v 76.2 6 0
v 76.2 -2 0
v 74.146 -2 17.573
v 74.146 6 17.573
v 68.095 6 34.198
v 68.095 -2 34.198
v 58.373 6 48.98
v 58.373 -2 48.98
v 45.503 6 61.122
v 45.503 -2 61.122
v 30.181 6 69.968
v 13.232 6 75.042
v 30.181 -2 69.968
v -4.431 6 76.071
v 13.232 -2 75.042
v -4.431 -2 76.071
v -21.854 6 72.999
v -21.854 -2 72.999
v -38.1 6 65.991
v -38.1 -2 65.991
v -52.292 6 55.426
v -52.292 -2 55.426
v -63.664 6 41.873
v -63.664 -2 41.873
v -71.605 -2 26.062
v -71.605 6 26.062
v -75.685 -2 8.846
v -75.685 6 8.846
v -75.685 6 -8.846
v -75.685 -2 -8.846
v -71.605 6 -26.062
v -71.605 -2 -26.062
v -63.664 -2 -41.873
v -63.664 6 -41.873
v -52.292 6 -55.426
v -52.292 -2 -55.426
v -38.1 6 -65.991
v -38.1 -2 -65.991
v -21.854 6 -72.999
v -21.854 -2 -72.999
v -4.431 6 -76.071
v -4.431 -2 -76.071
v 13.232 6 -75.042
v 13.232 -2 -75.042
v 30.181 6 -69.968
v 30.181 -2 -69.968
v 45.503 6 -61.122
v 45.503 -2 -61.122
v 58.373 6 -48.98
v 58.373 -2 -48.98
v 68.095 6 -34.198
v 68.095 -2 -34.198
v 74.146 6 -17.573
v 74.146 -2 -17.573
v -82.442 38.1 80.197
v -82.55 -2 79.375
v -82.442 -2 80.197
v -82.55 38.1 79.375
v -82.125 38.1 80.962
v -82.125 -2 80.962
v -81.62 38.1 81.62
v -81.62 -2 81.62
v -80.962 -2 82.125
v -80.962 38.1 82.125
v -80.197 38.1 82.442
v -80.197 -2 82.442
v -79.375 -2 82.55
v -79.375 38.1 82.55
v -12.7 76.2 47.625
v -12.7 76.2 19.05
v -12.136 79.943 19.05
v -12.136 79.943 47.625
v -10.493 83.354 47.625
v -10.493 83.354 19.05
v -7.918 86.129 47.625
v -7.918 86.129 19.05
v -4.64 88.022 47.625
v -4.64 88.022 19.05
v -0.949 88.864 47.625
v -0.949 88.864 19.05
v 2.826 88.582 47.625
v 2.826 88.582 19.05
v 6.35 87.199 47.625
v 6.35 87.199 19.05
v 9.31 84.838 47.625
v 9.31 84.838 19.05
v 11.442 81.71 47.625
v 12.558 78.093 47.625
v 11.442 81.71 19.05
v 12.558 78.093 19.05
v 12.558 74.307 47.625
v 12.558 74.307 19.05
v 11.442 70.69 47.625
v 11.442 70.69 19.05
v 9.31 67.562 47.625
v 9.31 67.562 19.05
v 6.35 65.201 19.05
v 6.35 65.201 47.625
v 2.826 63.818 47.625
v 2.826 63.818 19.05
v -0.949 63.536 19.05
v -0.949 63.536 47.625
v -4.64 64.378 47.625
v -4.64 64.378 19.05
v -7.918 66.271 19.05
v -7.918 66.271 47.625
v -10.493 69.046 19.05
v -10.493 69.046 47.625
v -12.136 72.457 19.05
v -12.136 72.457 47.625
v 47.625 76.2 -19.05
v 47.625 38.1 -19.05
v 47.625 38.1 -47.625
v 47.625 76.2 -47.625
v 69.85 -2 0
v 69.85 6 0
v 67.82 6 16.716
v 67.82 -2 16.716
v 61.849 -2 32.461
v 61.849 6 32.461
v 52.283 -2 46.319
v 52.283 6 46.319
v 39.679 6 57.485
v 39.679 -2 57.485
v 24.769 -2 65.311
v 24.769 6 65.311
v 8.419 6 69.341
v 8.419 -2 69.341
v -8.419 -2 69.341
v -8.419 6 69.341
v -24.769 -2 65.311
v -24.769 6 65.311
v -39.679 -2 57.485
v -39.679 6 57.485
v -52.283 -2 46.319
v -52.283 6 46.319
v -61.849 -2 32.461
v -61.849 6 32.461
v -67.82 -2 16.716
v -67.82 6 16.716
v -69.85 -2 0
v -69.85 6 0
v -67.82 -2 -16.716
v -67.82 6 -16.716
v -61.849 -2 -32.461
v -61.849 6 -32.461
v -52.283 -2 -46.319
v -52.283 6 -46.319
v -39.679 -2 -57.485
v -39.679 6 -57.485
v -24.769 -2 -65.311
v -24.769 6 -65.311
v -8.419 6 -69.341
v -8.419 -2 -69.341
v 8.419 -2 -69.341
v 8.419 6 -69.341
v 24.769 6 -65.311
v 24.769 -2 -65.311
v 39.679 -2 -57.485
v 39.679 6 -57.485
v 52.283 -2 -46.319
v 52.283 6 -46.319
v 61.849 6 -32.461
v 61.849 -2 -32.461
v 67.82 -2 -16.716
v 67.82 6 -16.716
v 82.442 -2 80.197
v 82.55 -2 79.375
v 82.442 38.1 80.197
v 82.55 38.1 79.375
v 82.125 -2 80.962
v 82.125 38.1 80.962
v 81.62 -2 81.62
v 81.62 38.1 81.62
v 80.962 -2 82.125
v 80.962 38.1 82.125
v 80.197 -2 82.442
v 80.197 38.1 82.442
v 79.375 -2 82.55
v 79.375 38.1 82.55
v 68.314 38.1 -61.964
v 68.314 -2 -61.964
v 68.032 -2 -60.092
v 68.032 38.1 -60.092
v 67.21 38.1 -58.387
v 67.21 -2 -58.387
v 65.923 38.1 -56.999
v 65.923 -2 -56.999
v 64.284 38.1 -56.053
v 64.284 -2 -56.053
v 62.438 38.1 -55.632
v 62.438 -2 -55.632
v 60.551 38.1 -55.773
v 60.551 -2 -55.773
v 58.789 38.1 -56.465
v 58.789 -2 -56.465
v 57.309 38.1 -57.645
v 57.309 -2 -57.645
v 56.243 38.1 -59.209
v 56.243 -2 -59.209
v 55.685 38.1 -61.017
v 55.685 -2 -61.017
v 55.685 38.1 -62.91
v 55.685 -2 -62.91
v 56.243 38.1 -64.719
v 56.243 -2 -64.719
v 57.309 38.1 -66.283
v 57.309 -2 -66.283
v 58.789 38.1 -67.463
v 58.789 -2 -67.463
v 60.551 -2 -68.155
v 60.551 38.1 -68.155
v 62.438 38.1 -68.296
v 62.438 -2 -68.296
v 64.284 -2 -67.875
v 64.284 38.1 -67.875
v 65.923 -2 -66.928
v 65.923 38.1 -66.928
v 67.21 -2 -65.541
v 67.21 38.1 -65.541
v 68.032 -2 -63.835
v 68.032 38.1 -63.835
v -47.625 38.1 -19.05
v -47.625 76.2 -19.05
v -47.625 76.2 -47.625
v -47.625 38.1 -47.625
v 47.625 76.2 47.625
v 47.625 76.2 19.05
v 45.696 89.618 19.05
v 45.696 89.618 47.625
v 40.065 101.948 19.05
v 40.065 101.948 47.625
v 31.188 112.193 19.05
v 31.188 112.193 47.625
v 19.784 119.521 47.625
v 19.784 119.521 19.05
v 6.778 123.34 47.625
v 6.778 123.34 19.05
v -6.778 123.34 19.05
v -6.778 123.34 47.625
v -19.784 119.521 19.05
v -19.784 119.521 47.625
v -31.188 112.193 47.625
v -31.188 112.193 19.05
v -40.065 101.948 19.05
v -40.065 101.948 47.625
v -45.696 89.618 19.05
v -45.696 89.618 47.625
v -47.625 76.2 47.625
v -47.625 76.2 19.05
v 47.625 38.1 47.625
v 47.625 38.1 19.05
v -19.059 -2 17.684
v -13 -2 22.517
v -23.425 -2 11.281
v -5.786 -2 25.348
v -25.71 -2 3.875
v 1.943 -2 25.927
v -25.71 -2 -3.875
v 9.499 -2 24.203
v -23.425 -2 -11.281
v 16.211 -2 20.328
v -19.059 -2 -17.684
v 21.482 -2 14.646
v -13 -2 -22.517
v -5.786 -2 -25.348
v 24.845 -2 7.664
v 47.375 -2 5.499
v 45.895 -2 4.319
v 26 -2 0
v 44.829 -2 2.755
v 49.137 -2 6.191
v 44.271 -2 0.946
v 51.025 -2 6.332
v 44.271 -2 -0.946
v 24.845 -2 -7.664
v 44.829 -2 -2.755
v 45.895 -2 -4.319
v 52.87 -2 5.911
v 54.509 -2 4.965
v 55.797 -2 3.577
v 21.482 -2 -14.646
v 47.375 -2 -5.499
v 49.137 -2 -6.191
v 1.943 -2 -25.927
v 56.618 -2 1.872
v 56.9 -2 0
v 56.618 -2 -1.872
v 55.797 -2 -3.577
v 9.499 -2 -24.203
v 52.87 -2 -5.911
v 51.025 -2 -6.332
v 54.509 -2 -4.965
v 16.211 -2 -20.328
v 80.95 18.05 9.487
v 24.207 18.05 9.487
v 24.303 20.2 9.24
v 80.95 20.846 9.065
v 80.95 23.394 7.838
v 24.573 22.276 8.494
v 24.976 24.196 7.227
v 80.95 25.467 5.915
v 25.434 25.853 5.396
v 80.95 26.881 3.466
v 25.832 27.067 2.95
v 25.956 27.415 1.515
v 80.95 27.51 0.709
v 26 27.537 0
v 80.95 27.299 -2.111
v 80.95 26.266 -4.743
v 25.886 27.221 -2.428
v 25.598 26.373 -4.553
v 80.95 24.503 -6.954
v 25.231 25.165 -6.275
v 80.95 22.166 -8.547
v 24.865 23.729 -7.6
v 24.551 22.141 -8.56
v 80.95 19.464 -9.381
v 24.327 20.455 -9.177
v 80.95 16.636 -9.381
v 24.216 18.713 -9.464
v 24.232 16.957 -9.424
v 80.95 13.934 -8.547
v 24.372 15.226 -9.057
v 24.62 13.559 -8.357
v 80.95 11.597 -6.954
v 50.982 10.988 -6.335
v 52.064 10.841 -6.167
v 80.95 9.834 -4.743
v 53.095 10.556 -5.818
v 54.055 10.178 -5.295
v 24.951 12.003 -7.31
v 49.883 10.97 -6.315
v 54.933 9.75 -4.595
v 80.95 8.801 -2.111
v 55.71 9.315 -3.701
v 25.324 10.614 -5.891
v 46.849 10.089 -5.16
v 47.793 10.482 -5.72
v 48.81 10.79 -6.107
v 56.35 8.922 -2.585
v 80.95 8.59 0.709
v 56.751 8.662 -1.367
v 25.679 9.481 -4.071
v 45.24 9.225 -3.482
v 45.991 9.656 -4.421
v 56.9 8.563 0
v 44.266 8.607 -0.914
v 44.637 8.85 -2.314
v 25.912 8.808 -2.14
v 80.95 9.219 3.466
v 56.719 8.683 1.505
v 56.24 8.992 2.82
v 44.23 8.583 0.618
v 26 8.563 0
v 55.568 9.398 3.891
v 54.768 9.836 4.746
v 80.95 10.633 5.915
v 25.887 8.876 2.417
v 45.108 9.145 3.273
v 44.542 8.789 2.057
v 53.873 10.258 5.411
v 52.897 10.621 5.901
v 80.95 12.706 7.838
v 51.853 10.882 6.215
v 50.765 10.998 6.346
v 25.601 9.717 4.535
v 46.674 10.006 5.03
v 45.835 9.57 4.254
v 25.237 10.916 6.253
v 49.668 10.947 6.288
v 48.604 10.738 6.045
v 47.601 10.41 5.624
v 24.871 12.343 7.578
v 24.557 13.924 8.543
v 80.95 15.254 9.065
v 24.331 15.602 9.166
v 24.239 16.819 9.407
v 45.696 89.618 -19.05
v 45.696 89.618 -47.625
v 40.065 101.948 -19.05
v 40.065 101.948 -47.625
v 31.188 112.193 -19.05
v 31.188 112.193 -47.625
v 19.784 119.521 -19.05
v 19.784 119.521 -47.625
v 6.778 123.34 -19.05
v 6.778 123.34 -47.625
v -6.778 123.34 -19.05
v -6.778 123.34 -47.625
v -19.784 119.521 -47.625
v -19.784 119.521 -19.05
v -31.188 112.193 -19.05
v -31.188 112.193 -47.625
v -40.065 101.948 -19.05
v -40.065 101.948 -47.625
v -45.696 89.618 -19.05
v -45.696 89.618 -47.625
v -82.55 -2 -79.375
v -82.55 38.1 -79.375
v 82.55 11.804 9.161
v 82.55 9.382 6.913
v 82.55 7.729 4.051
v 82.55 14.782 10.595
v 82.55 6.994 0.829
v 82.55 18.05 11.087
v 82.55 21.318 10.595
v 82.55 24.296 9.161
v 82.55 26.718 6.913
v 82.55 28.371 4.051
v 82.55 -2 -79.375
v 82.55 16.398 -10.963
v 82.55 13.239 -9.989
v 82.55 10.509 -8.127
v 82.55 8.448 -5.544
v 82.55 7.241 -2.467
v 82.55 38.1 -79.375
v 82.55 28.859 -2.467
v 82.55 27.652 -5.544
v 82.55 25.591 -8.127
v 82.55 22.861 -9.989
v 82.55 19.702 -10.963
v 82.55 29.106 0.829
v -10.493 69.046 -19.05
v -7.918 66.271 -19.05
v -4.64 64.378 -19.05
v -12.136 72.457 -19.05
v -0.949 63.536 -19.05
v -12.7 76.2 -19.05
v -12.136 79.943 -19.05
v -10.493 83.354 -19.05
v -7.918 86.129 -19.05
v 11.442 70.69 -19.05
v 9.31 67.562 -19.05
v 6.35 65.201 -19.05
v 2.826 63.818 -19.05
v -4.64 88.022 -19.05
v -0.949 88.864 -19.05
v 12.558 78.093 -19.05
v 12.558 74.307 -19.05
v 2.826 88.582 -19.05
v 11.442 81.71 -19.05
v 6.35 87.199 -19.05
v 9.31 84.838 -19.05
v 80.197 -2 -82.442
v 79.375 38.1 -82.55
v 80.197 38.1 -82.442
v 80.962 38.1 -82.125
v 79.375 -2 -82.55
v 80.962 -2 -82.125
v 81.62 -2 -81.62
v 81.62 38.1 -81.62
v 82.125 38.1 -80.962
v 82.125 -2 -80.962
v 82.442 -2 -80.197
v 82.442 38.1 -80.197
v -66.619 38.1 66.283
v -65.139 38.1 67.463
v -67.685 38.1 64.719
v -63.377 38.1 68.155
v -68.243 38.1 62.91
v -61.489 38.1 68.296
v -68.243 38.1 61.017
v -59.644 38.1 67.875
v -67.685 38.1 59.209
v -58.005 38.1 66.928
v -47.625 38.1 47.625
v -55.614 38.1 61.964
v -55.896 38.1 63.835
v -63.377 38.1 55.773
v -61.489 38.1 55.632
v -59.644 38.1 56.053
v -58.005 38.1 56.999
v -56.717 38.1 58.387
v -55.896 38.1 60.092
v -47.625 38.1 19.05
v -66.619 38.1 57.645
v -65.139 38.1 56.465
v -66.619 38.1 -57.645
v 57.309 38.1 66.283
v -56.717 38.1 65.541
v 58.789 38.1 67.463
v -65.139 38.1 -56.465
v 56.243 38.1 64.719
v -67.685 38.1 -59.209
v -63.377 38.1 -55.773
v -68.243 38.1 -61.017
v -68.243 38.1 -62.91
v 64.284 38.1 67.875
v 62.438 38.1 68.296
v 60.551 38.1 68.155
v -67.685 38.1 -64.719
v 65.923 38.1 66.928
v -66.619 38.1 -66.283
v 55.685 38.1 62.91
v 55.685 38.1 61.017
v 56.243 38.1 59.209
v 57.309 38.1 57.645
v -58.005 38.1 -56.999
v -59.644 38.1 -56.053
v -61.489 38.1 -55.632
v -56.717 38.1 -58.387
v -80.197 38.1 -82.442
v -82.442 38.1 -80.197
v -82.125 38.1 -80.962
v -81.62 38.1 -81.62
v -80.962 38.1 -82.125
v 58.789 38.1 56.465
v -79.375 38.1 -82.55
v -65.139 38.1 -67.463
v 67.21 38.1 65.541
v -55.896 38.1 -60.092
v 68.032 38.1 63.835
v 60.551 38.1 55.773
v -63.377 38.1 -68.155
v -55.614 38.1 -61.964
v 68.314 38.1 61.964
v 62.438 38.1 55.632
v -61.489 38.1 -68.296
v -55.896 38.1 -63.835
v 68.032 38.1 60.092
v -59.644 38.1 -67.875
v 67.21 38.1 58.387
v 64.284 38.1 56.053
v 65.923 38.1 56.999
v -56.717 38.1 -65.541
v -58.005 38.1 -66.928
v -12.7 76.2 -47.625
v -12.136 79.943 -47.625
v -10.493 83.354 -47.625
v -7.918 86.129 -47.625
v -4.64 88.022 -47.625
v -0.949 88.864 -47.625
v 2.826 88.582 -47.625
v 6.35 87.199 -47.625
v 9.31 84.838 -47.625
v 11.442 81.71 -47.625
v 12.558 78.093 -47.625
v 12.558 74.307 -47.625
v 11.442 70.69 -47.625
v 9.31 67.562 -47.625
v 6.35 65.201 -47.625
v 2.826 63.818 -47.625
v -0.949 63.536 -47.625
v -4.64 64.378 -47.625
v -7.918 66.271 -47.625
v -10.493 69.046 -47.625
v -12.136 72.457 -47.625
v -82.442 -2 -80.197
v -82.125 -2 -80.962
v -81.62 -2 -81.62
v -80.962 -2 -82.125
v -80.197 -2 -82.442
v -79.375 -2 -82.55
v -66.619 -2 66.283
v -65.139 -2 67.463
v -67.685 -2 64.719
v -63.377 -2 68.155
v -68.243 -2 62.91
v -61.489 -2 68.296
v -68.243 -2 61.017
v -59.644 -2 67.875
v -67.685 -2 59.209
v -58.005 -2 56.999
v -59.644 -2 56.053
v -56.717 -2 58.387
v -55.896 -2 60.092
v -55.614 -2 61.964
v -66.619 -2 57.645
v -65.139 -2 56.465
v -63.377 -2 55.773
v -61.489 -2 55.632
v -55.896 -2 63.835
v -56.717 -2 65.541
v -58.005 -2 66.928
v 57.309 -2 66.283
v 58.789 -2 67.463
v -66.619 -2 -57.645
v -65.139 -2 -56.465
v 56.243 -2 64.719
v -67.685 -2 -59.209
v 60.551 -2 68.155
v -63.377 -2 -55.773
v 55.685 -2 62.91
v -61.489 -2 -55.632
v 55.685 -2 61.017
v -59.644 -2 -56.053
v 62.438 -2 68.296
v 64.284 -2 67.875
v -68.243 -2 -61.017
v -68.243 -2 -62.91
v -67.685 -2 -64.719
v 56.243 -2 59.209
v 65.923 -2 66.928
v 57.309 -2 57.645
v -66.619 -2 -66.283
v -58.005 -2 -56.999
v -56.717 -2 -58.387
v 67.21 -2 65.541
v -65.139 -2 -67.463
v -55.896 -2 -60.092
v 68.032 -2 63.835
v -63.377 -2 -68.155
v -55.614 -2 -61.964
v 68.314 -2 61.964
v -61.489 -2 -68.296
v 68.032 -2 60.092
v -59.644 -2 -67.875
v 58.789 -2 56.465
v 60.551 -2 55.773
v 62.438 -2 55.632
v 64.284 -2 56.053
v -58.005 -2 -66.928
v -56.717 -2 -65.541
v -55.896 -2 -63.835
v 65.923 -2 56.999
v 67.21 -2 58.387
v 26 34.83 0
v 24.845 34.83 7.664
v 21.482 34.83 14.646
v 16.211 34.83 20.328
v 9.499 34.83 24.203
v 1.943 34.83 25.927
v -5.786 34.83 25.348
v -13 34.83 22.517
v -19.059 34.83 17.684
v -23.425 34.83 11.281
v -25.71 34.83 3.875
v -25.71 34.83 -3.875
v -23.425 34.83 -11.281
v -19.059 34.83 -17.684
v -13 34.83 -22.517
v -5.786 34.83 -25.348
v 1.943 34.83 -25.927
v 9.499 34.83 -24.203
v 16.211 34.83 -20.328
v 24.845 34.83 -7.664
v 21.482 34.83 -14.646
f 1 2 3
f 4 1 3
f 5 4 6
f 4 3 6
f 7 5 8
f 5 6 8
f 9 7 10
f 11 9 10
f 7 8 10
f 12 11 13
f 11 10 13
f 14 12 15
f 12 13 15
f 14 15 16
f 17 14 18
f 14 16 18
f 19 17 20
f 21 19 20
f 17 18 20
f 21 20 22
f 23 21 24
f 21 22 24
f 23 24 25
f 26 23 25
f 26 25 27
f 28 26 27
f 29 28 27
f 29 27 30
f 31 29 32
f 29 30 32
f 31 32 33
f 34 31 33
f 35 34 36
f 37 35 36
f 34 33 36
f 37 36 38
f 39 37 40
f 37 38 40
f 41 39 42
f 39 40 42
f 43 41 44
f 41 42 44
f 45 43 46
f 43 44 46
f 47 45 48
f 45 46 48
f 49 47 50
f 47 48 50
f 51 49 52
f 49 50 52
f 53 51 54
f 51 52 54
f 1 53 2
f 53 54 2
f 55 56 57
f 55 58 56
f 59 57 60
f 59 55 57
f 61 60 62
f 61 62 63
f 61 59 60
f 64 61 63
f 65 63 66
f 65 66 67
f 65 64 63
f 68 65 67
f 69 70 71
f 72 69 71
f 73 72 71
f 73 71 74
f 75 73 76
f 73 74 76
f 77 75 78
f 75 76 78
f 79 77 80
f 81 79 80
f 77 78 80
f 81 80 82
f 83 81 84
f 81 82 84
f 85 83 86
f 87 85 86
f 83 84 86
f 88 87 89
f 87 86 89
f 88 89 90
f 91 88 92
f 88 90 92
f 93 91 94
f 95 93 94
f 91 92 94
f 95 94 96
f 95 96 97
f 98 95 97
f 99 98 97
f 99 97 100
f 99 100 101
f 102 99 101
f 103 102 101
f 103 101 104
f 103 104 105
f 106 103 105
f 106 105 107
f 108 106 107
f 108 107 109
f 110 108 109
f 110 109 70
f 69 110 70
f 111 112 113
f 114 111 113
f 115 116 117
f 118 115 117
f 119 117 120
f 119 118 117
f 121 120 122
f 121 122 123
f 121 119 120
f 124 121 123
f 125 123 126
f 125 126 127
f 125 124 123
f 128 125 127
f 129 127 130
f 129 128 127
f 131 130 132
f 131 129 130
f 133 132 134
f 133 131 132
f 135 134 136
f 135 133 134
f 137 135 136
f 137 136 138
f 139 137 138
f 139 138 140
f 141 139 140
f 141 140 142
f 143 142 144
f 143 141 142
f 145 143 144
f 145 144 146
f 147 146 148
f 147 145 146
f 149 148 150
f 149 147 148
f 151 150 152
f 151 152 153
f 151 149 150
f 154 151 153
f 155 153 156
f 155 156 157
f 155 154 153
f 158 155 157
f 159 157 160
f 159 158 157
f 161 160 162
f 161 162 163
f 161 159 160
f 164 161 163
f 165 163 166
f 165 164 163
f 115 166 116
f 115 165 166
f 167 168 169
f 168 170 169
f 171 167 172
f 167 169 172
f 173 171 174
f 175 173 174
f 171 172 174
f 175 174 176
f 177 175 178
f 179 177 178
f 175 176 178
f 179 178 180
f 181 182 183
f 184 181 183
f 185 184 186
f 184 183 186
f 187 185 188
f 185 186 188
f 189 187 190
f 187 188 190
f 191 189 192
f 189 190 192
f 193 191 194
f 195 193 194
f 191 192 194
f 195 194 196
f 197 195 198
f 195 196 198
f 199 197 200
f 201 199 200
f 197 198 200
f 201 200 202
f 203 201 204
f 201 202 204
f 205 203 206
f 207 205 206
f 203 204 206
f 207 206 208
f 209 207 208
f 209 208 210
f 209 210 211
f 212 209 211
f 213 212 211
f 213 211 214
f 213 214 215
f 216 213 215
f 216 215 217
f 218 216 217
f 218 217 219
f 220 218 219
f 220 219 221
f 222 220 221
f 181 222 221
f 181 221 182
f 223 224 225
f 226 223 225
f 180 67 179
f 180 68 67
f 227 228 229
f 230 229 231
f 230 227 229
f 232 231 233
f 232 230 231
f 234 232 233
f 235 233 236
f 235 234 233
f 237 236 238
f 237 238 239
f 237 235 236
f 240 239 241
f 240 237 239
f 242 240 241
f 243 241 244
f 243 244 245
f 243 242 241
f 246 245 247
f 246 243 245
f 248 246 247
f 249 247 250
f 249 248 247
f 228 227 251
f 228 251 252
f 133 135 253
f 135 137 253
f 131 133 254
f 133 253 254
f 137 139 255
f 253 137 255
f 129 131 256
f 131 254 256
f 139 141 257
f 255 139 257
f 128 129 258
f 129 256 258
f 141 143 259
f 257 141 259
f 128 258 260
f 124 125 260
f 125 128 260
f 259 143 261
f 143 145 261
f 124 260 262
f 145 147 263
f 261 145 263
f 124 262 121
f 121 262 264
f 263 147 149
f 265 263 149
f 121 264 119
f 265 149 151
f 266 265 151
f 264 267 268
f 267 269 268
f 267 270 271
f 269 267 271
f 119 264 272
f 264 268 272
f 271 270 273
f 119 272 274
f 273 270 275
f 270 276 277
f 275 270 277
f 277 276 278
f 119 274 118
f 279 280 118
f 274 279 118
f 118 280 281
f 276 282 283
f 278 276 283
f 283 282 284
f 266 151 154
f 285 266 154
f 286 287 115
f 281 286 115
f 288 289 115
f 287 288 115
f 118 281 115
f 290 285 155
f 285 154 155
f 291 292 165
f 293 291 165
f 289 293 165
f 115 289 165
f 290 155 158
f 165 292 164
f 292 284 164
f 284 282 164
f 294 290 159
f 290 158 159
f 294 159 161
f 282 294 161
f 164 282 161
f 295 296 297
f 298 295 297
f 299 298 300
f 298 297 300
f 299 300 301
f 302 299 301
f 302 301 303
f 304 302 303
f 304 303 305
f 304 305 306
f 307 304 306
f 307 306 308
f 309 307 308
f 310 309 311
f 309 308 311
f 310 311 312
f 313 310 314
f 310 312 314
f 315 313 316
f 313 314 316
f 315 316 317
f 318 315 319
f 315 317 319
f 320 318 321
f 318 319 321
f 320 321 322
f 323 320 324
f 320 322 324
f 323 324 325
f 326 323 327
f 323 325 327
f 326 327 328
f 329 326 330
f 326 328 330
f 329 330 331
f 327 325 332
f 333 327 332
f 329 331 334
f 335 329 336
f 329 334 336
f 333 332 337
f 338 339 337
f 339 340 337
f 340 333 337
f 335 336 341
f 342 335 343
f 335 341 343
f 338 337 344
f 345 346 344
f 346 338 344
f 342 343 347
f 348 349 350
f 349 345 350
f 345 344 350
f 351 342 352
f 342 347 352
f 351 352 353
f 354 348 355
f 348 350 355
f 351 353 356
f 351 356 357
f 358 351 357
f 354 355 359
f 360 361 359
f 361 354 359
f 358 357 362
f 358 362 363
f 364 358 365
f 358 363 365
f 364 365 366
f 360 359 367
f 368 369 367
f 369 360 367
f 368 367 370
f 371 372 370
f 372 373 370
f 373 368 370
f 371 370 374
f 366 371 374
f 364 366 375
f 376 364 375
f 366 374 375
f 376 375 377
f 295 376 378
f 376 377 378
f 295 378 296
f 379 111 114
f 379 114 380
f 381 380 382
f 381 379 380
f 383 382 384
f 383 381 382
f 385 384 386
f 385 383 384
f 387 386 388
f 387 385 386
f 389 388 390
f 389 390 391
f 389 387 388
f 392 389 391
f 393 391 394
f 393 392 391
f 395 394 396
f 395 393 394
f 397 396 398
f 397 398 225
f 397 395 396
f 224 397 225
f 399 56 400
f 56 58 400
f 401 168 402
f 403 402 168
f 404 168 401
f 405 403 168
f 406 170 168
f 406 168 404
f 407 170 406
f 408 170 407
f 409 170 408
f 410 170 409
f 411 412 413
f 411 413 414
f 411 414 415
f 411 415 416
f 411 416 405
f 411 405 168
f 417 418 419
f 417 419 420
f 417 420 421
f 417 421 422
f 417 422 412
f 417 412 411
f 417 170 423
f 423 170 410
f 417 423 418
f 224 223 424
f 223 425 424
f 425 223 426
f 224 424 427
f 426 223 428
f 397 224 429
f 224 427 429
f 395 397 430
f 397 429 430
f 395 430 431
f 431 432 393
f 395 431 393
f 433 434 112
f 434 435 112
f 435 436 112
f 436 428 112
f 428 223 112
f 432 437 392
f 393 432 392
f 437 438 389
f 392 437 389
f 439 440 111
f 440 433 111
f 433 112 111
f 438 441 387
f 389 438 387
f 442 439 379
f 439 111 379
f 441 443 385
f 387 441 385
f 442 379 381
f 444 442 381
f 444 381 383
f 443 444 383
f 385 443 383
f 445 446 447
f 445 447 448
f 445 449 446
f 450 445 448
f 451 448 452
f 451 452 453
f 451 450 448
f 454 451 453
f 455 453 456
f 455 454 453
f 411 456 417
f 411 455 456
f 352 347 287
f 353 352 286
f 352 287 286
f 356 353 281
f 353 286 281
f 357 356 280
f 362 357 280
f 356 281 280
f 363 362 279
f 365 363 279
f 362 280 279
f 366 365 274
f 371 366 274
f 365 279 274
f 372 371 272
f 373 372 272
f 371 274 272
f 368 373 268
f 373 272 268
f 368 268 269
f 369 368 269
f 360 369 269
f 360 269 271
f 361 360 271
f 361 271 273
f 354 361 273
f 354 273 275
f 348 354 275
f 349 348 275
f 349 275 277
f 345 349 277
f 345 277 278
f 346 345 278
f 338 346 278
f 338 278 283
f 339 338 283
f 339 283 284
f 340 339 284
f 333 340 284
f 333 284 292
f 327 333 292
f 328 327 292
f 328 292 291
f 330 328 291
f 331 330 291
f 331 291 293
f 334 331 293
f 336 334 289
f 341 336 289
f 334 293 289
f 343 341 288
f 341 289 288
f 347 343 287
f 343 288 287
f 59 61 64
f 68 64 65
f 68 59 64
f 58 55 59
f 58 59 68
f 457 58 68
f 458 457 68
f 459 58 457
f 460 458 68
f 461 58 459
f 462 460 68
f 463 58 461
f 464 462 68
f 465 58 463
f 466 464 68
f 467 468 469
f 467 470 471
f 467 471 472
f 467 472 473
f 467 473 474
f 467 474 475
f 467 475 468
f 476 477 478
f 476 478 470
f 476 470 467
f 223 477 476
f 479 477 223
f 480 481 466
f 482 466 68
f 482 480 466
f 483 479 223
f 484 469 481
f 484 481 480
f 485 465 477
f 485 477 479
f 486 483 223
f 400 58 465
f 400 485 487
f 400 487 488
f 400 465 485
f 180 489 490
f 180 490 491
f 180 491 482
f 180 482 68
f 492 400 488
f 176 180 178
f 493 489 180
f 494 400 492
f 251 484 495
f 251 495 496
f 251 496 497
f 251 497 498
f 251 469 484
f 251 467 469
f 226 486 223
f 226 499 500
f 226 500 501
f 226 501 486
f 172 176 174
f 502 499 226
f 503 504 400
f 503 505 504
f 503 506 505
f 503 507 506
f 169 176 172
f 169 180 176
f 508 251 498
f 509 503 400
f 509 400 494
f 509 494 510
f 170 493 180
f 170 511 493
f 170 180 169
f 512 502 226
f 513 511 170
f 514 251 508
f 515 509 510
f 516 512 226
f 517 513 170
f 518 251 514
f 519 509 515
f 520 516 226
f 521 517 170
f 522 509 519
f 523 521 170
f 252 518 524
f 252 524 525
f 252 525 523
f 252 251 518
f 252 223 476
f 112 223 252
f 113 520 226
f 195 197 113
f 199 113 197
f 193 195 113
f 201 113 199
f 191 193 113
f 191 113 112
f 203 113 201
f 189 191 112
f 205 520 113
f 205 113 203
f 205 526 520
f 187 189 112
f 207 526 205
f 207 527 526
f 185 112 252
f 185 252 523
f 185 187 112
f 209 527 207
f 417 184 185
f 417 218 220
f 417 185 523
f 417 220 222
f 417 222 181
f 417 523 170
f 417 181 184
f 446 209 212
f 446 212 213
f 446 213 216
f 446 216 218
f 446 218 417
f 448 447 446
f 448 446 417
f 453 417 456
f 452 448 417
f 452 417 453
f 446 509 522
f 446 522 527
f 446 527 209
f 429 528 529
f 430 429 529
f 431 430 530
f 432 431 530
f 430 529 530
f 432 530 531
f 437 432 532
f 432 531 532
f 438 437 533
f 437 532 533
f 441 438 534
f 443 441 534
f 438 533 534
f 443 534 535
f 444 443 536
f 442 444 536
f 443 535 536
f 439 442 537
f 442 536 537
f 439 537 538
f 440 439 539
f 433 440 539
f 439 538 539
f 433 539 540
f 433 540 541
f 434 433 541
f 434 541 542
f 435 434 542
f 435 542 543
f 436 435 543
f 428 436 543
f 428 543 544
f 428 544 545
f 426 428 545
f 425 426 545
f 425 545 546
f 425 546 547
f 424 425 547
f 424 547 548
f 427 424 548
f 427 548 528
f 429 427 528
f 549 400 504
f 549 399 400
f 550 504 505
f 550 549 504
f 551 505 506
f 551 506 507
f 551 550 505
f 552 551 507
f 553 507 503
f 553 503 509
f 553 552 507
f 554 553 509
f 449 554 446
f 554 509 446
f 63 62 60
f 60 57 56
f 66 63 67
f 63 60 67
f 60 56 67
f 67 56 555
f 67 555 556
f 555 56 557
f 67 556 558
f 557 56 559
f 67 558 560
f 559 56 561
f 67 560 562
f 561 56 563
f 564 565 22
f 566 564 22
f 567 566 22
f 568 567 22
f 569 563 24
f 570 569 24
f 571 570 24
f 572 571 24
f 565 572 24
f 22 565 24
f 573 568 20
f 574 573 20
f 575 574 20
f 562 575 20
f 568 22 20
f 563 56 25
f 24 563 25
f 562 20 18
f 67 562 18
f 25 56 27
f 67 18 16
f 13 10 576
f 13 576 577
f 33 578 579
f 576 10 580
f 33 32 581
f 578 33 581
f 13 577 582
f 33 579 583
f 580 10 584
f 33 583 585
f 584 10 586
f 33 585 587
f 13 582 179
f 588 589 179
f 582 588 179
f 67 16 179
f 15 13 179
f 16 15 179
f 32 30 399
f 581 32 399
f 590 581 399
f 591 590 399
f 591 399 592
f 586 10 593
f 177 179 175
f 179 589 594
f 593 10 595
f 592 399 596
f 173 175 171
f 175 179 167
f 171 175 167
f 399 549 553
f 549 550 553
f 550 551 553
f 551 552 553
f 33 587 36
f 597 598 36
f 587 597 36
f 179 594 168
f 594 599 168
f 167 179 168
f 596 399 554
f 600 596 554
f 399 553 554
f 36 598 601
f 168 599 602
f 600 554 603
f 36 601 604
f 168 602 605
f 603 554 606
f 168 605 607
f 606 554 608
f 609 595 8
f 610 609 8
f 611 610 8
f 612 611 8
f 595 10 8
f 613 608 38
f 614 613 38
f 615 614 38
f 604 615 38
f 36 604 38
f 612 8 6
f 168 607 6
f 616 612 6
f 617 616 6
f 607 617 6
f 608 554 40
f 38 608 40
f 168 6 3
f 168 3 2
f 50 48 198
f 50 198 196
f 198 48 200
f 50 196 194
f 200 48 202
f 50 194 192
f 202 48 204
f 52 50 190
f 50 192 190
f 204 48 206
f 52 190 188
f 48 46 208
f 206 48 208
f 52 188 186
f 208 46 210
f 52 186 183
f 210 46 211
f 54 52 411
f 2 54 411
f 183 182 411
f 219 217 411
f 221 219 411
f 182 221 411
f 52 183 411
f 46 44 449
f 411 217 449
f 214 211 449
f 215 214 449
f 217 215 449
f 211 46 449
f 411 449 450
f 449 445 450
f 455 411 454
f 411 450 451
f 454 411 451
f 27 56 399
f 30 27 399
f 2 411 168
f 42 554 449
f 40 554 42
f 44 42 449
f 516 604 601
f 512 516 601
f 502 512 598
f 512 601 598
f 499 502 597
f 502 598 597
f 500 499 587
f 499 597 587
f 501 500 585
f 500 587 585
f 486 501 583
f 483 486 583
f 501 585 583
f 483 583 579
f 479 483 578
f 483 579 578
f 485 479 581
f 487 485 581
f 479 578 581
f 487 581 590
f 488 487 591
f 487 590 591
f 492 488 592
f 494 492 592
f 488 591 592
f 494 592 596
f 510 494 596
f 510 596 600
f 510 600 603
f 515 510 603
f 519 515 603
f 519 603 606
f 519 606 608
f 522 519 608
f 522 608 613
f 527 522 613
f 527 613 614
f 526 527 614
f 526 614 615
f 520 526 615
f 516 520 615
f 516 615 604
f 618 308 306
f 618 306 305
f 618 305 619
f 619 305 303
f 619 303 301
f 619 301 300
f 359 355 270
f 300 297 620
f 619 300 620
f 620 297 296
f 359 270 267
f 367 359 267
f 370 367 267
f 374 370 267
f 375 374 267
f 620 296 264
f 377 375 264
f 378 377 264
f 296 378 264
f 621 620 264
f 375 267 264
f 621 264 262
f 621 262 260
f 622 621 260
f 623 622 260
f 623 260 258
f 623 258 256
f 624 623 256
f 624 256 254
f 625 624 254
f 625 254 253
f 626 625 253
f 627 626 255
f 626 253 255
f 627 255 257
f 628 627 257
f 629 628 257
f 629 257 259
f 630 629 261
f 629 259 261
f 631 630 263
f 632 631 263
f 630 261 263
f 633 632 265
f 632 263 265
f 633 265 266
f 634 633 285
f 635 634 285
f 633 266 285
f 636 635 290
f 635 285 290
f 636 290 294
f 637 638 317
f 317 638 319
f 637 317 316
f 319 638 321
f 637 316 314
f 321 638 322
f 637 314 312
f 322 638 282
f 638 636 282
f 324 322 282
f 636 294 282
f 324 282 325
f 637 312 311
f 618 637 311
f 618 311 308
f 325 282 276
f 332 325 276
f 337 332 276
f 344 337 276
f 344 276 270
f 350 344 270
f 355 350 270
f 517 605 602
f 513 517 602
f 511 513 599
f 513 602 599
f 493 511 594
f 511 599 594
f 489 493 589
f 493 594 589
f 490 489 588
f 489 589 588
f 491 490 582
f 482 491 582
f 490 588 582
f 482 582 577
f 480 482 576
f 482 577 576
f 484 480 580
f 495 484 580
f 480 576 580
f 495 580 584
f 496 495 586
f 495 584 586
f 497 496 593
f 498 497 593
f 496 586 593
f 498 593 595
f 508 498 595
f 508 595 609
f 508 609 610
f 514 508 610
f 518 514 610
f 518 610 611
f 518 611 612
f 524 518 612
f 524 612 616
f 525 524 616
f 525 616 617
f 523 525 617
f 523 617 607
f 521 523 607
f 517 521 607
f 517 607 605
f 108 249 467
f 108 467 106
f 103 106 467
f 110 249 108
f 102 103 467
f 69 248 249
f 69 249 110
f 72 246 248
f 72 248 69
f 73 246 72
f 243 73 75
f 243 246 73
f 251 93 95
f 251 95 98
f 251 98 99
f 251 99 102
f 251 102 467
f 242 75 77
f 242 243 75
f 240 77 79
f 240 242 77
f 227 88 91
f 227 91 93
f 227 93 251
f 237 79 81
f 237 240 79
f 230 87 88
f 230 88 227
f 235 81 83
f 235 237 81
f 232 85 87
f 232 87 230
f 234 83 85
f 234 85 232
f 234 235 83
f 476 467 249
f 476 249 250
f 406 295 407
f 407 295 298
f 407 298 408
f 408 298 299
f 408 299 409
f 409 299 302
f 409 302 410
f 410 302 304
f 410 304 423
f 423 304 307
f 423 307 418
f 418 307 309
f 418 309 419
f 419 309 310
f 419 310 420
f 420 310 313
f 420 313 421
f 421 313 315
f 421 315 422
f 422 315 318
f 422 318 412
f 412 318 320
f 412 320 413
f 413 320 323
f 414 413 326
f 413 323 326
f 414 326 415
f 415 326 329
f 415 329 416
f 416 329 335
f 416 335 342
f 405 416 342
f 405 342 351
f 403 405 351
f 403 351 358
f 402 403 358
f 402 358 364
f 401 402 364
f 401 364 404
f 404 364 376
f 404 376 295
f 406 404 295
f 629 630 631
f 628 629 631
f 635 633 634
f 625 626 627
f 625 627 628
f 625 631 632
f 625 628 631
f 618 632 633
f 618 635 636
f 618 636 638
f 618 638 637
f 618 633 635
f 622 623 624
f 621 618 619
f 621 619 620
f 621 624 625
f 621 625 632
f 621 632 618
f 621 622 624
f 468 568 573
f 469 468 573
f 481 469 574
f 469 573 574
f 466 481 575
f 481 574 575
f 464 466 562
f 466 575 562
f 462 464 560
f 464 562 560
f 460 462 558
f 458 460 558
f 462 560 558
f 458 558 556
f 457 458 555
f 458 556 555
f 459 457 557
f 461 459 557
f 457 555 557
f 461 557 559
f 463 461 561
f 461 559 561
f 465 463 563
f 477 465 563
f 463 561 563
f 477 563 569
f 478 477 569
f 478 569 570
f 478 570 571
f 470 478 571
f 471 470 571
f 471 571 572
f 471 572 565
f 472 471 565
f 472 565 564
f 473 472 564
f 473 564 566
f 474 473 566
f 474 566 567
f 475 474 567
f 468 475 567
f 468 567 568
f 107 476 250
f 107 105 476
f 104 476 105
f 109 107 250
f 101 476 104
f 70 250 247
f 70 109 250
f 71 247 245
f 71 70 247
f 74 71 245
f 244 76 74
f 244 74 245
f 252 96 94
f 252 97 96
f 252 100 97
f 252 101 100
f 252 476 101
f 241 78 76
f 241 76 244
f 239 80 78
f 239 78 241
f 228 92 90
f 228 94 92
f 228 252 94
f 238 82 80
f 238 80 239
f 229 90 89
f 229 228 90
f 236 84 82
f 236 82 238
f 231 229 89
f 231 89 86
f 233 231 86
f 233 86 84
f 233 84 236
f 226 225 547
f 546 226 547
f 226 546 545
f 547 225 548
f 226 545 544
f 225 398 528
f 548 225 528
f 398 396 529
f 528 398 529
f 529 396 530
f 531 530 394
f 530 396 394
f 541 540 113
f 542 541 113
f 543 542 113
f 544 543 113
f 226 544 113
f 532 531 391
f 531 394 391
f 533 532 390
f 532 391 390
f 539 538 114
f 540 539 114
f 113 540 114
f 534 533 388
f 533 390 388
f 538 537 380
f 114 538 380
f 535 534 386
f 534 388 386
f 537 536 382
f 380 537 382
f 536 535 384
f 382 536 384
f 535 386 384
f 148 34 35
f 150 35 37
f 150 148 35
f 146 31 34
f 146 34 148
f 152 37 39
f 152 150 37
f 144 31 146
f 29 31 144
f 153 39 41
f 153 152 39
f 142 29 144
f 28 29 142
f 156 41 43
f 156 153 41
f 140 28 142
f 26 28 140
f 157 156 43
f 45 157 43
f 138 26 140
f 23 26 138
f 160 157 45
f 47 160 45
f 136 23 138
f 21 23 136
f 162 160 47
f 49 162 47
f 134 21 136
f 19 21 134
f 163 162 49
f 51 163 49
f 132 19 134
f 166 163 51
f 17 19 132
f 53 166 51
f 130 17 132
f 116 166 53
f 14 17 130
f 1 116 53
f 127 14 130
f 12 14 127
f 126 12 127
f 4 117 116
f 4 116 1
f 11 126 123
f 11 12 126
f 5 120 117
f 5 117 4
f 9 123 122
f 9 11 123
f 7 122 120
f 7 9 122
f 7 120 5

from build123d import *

# Parameters (mm, degrees)
SKETCH1_W                              = 165.1
SKETCH1_H                              = 165.1
BOSS_EXTRUDE1_DEPTH                    = 38.1
BOSS_EXTRUDE1_DEPTH_BACK               = 2
SKETCH2_W                              = 95.25
SKETCH2_H                              = 95.25
BOSS_EXTRUDE2_DEPTH                    = 38.1
BOSS_EXTRUDE3_START                    = -95.25
BOSS_EXTRUDE3_DEPTH                    = 95.25
SKETCH7_R                              = 12.7
CUT_EXTRUDE1_DEPTH                     = 131.175
SKETCH8_W                              = 38.1
SKETCH8_H                              = 1000
CUT_EXTRUDE2_DEPTH                     = 131.175
FILLET1_R                              = 3.175
SKETCH9_R                              = 26
CUT_EXTRUDE3_DEPTH                     = 36.83
SKETCH10_R                             = 76.2
SKETCH10_R_2                           = 69.85
CUT_EXTRUDE4_DEPTH                     = 8
F_1_2_14_NPSM_TAPPED_HOLE2_D           = 18.9738
F_1_2_14_NPSM_TAPPED_HOLE2_DEPTH       = 63.5
F_1_2_14_NPSM_TAPPED_HOLE2_CSINK_D     = 22.1742
F_1_2_14_NPSM_TAPPED_HOLE2_CSINK_ANGLE = 90
F_1_2_14_NPSM_TAPPED_HOLE2_TIP         = 5.700304607
SKETCH16_R                             = 6.35
CUT_EXTRUDE5_DEPTH                     = 25
SKETCH17_R                             = 6.35
CUT_EXTRUDE6_DEPTH                     = 126.825


with BuildPart() as part:
    # Sketch1 → Boss-Extrude1 (new body, two sides)
    with BuildSketch(Plane(origin=(0, 0, 0), x_dir=(1, 0, 0), z_dir=(0, 1, 0))) as boss_extrude1_sk:
        Rectangle(SKETCH1_W, SKETCH1_H)
    extrude(amount=BOSS_EXTRUDE1_DEPTH)
    extrude(boss_extrude1_sk.sketch, amount=-BOSS_EXTRUDE1_DEPTH_BACK)

    # Sketch2 → Boss-Extrude2 (add)
    with BuildSketch(Plane(origin=(0, 38.1, 0), x_dir=(1, 0, 0), z_dir=(0, 1, 0))):
        Rectangle(SKETCH2_W, SKETCH2_H)
    extrude(amount=BOSS_EXTRUDE2_DEPTH)

    # Sketch3 → Boss-Extrude3 (add)
    with BuildSketch(Plane(origin=(0, 0, -47.625), x_dir=(-1, 0, 0), z_dir=(0, 0, -1)).offset(BOSS_EXTRUDE3_START)):
        with BuildLine():
            Line((47.625, 76.2), (-47.625, 76.2))
            ThreePointArc((-47.625, 76.2), (0, 123.825), (47.625, 76.2))
        make_face()
    extrude(amount=BOSS_EXTRUDE3_DEPTH)

    # Sketch7 → Cut-Extrude1 (cut, through all)
    with BuildSketch(Plane(origin=(0, 0, -47.625), x_dir=(-1, 0, 0), z_dir=(0, 0, -1))):
        with Locations((0, 76.2)):
            Circle(SKETCH7_R)
    extrude(amount=-CUT_EXTRUDE1_DEPTH, mode=Mode.SUBTRACT)

    # Sketch8 → Cut-Extrude2 (cut, through all)
    with BuildSketch(Plane(origin=(47.625, 0, 0), x_dir=(0, 0, -1), z_dir=(1, 0, 0))):
        with Locations((0, 538.1)):
            Rectangle(SKETCH8_W, SKETCH8_H)
    extrude(amount=-CUT_EXTRUDE2_DEPTH, mode=Mode.SUBTRACT)

    # Fillet1
    fillet1_edges = [part.edges().sort_by_distance(p)[0] for p in [
        (82.55, 18.05, 82.55),
        (-82.55, 18.05, 82.55),
        (-82.55, 18.05, -82.55),
        (82.55, 18.05, -82.55),
    ]]
    fillet(fillet1_edges, radius=FILLET1_R)

    # Sketch9 → Cut-Extrude3 (cut)
    with BuildSketch(Plane.XZ.offset(2)):
        Circle(SKETCH9_R)
    extrude(amount=-CUT_EXTRUDE3_DEPTH, mode=Mode.SUBTRACT)

    # Sketch10 → Cut-Extrude4 (cut)
    with BuildSketch(Plane.XZ.offset(2)):
        Circle(SKETCH10_R)
        Circle(SKETCH10_R_2, mode=Mode.SUBTRACT)
    extrude(amount=-CUT_EXTRUDE4_DEPTH, mode=Mode.SUBTRACT)

    # 1/2-14 NPSM Tapped Hole2
    with Locations(Plane(origin=(82.55, 0, 0), x_dir=(0, 0, -1), z_dir=(1, 0, 0))):
        with Locations((0, 18.05)):
            CounterSinkHole(F_1_2_14_NPSM_TAPPED_HOLE2_D / 2, F_1_2_14_NPSM_TAPPED_HOLE2_CSINK_D / 2, depth=F_1_2_14_NPSM_TAPPED_HOLE2_DEPTH, counter_sink_angle=F_1_2_14_NPSM_TAPPED_HOLE2_CSINK_ANGLE)
            with Locations((0, 0, -(F_1_2_14_NPSM_TAPPED_HOLE2_DEPTH + F_1_2_14_NPSM_TAPPED_HOLE2_TIP / 2))):  # 118° drill point
                Cone(0, F_1_2_14_NPSM_TAPPED_HOLE2_D / 2, F_1_2_14_NPSM_TAPPED_HOLE2_TIP, mode=Mode.SUBTRACT)

    # Sketch16 → Cut-Extrude5 (cut)
    with BuildSketch(Plane.XZ.offset(2)):
        with Locations((50.55, 0)):
            Circle(SKETCH16_R)
    extrude(amount=-CUT_EXTRUDE5_DEPTH, mode=Mode.SUBTRACT)

    # Sketch17 → Cut-Extrude6 (cut, through all)
    with BuildSketch(Plane.XZ.offset(2)):
        with Locations((-61.963767235, 61.963767235)):
            Circle(SKETCH17_R)
        with Locations((61.963767235, 61.963767235)):
            Circle(SKETCH17_R)
        with Locations((61.963767235, -61.963767235)):
            Circle(SKETCH17_R)
        with Locations((-61.963767235, -61.963767235)):
            Circle(SKETCH17_R)
    extrude(amount=-CUT_EXTRUDE6_DEPTH, mode=Mode.SUBTRACT)


solid = part.part
